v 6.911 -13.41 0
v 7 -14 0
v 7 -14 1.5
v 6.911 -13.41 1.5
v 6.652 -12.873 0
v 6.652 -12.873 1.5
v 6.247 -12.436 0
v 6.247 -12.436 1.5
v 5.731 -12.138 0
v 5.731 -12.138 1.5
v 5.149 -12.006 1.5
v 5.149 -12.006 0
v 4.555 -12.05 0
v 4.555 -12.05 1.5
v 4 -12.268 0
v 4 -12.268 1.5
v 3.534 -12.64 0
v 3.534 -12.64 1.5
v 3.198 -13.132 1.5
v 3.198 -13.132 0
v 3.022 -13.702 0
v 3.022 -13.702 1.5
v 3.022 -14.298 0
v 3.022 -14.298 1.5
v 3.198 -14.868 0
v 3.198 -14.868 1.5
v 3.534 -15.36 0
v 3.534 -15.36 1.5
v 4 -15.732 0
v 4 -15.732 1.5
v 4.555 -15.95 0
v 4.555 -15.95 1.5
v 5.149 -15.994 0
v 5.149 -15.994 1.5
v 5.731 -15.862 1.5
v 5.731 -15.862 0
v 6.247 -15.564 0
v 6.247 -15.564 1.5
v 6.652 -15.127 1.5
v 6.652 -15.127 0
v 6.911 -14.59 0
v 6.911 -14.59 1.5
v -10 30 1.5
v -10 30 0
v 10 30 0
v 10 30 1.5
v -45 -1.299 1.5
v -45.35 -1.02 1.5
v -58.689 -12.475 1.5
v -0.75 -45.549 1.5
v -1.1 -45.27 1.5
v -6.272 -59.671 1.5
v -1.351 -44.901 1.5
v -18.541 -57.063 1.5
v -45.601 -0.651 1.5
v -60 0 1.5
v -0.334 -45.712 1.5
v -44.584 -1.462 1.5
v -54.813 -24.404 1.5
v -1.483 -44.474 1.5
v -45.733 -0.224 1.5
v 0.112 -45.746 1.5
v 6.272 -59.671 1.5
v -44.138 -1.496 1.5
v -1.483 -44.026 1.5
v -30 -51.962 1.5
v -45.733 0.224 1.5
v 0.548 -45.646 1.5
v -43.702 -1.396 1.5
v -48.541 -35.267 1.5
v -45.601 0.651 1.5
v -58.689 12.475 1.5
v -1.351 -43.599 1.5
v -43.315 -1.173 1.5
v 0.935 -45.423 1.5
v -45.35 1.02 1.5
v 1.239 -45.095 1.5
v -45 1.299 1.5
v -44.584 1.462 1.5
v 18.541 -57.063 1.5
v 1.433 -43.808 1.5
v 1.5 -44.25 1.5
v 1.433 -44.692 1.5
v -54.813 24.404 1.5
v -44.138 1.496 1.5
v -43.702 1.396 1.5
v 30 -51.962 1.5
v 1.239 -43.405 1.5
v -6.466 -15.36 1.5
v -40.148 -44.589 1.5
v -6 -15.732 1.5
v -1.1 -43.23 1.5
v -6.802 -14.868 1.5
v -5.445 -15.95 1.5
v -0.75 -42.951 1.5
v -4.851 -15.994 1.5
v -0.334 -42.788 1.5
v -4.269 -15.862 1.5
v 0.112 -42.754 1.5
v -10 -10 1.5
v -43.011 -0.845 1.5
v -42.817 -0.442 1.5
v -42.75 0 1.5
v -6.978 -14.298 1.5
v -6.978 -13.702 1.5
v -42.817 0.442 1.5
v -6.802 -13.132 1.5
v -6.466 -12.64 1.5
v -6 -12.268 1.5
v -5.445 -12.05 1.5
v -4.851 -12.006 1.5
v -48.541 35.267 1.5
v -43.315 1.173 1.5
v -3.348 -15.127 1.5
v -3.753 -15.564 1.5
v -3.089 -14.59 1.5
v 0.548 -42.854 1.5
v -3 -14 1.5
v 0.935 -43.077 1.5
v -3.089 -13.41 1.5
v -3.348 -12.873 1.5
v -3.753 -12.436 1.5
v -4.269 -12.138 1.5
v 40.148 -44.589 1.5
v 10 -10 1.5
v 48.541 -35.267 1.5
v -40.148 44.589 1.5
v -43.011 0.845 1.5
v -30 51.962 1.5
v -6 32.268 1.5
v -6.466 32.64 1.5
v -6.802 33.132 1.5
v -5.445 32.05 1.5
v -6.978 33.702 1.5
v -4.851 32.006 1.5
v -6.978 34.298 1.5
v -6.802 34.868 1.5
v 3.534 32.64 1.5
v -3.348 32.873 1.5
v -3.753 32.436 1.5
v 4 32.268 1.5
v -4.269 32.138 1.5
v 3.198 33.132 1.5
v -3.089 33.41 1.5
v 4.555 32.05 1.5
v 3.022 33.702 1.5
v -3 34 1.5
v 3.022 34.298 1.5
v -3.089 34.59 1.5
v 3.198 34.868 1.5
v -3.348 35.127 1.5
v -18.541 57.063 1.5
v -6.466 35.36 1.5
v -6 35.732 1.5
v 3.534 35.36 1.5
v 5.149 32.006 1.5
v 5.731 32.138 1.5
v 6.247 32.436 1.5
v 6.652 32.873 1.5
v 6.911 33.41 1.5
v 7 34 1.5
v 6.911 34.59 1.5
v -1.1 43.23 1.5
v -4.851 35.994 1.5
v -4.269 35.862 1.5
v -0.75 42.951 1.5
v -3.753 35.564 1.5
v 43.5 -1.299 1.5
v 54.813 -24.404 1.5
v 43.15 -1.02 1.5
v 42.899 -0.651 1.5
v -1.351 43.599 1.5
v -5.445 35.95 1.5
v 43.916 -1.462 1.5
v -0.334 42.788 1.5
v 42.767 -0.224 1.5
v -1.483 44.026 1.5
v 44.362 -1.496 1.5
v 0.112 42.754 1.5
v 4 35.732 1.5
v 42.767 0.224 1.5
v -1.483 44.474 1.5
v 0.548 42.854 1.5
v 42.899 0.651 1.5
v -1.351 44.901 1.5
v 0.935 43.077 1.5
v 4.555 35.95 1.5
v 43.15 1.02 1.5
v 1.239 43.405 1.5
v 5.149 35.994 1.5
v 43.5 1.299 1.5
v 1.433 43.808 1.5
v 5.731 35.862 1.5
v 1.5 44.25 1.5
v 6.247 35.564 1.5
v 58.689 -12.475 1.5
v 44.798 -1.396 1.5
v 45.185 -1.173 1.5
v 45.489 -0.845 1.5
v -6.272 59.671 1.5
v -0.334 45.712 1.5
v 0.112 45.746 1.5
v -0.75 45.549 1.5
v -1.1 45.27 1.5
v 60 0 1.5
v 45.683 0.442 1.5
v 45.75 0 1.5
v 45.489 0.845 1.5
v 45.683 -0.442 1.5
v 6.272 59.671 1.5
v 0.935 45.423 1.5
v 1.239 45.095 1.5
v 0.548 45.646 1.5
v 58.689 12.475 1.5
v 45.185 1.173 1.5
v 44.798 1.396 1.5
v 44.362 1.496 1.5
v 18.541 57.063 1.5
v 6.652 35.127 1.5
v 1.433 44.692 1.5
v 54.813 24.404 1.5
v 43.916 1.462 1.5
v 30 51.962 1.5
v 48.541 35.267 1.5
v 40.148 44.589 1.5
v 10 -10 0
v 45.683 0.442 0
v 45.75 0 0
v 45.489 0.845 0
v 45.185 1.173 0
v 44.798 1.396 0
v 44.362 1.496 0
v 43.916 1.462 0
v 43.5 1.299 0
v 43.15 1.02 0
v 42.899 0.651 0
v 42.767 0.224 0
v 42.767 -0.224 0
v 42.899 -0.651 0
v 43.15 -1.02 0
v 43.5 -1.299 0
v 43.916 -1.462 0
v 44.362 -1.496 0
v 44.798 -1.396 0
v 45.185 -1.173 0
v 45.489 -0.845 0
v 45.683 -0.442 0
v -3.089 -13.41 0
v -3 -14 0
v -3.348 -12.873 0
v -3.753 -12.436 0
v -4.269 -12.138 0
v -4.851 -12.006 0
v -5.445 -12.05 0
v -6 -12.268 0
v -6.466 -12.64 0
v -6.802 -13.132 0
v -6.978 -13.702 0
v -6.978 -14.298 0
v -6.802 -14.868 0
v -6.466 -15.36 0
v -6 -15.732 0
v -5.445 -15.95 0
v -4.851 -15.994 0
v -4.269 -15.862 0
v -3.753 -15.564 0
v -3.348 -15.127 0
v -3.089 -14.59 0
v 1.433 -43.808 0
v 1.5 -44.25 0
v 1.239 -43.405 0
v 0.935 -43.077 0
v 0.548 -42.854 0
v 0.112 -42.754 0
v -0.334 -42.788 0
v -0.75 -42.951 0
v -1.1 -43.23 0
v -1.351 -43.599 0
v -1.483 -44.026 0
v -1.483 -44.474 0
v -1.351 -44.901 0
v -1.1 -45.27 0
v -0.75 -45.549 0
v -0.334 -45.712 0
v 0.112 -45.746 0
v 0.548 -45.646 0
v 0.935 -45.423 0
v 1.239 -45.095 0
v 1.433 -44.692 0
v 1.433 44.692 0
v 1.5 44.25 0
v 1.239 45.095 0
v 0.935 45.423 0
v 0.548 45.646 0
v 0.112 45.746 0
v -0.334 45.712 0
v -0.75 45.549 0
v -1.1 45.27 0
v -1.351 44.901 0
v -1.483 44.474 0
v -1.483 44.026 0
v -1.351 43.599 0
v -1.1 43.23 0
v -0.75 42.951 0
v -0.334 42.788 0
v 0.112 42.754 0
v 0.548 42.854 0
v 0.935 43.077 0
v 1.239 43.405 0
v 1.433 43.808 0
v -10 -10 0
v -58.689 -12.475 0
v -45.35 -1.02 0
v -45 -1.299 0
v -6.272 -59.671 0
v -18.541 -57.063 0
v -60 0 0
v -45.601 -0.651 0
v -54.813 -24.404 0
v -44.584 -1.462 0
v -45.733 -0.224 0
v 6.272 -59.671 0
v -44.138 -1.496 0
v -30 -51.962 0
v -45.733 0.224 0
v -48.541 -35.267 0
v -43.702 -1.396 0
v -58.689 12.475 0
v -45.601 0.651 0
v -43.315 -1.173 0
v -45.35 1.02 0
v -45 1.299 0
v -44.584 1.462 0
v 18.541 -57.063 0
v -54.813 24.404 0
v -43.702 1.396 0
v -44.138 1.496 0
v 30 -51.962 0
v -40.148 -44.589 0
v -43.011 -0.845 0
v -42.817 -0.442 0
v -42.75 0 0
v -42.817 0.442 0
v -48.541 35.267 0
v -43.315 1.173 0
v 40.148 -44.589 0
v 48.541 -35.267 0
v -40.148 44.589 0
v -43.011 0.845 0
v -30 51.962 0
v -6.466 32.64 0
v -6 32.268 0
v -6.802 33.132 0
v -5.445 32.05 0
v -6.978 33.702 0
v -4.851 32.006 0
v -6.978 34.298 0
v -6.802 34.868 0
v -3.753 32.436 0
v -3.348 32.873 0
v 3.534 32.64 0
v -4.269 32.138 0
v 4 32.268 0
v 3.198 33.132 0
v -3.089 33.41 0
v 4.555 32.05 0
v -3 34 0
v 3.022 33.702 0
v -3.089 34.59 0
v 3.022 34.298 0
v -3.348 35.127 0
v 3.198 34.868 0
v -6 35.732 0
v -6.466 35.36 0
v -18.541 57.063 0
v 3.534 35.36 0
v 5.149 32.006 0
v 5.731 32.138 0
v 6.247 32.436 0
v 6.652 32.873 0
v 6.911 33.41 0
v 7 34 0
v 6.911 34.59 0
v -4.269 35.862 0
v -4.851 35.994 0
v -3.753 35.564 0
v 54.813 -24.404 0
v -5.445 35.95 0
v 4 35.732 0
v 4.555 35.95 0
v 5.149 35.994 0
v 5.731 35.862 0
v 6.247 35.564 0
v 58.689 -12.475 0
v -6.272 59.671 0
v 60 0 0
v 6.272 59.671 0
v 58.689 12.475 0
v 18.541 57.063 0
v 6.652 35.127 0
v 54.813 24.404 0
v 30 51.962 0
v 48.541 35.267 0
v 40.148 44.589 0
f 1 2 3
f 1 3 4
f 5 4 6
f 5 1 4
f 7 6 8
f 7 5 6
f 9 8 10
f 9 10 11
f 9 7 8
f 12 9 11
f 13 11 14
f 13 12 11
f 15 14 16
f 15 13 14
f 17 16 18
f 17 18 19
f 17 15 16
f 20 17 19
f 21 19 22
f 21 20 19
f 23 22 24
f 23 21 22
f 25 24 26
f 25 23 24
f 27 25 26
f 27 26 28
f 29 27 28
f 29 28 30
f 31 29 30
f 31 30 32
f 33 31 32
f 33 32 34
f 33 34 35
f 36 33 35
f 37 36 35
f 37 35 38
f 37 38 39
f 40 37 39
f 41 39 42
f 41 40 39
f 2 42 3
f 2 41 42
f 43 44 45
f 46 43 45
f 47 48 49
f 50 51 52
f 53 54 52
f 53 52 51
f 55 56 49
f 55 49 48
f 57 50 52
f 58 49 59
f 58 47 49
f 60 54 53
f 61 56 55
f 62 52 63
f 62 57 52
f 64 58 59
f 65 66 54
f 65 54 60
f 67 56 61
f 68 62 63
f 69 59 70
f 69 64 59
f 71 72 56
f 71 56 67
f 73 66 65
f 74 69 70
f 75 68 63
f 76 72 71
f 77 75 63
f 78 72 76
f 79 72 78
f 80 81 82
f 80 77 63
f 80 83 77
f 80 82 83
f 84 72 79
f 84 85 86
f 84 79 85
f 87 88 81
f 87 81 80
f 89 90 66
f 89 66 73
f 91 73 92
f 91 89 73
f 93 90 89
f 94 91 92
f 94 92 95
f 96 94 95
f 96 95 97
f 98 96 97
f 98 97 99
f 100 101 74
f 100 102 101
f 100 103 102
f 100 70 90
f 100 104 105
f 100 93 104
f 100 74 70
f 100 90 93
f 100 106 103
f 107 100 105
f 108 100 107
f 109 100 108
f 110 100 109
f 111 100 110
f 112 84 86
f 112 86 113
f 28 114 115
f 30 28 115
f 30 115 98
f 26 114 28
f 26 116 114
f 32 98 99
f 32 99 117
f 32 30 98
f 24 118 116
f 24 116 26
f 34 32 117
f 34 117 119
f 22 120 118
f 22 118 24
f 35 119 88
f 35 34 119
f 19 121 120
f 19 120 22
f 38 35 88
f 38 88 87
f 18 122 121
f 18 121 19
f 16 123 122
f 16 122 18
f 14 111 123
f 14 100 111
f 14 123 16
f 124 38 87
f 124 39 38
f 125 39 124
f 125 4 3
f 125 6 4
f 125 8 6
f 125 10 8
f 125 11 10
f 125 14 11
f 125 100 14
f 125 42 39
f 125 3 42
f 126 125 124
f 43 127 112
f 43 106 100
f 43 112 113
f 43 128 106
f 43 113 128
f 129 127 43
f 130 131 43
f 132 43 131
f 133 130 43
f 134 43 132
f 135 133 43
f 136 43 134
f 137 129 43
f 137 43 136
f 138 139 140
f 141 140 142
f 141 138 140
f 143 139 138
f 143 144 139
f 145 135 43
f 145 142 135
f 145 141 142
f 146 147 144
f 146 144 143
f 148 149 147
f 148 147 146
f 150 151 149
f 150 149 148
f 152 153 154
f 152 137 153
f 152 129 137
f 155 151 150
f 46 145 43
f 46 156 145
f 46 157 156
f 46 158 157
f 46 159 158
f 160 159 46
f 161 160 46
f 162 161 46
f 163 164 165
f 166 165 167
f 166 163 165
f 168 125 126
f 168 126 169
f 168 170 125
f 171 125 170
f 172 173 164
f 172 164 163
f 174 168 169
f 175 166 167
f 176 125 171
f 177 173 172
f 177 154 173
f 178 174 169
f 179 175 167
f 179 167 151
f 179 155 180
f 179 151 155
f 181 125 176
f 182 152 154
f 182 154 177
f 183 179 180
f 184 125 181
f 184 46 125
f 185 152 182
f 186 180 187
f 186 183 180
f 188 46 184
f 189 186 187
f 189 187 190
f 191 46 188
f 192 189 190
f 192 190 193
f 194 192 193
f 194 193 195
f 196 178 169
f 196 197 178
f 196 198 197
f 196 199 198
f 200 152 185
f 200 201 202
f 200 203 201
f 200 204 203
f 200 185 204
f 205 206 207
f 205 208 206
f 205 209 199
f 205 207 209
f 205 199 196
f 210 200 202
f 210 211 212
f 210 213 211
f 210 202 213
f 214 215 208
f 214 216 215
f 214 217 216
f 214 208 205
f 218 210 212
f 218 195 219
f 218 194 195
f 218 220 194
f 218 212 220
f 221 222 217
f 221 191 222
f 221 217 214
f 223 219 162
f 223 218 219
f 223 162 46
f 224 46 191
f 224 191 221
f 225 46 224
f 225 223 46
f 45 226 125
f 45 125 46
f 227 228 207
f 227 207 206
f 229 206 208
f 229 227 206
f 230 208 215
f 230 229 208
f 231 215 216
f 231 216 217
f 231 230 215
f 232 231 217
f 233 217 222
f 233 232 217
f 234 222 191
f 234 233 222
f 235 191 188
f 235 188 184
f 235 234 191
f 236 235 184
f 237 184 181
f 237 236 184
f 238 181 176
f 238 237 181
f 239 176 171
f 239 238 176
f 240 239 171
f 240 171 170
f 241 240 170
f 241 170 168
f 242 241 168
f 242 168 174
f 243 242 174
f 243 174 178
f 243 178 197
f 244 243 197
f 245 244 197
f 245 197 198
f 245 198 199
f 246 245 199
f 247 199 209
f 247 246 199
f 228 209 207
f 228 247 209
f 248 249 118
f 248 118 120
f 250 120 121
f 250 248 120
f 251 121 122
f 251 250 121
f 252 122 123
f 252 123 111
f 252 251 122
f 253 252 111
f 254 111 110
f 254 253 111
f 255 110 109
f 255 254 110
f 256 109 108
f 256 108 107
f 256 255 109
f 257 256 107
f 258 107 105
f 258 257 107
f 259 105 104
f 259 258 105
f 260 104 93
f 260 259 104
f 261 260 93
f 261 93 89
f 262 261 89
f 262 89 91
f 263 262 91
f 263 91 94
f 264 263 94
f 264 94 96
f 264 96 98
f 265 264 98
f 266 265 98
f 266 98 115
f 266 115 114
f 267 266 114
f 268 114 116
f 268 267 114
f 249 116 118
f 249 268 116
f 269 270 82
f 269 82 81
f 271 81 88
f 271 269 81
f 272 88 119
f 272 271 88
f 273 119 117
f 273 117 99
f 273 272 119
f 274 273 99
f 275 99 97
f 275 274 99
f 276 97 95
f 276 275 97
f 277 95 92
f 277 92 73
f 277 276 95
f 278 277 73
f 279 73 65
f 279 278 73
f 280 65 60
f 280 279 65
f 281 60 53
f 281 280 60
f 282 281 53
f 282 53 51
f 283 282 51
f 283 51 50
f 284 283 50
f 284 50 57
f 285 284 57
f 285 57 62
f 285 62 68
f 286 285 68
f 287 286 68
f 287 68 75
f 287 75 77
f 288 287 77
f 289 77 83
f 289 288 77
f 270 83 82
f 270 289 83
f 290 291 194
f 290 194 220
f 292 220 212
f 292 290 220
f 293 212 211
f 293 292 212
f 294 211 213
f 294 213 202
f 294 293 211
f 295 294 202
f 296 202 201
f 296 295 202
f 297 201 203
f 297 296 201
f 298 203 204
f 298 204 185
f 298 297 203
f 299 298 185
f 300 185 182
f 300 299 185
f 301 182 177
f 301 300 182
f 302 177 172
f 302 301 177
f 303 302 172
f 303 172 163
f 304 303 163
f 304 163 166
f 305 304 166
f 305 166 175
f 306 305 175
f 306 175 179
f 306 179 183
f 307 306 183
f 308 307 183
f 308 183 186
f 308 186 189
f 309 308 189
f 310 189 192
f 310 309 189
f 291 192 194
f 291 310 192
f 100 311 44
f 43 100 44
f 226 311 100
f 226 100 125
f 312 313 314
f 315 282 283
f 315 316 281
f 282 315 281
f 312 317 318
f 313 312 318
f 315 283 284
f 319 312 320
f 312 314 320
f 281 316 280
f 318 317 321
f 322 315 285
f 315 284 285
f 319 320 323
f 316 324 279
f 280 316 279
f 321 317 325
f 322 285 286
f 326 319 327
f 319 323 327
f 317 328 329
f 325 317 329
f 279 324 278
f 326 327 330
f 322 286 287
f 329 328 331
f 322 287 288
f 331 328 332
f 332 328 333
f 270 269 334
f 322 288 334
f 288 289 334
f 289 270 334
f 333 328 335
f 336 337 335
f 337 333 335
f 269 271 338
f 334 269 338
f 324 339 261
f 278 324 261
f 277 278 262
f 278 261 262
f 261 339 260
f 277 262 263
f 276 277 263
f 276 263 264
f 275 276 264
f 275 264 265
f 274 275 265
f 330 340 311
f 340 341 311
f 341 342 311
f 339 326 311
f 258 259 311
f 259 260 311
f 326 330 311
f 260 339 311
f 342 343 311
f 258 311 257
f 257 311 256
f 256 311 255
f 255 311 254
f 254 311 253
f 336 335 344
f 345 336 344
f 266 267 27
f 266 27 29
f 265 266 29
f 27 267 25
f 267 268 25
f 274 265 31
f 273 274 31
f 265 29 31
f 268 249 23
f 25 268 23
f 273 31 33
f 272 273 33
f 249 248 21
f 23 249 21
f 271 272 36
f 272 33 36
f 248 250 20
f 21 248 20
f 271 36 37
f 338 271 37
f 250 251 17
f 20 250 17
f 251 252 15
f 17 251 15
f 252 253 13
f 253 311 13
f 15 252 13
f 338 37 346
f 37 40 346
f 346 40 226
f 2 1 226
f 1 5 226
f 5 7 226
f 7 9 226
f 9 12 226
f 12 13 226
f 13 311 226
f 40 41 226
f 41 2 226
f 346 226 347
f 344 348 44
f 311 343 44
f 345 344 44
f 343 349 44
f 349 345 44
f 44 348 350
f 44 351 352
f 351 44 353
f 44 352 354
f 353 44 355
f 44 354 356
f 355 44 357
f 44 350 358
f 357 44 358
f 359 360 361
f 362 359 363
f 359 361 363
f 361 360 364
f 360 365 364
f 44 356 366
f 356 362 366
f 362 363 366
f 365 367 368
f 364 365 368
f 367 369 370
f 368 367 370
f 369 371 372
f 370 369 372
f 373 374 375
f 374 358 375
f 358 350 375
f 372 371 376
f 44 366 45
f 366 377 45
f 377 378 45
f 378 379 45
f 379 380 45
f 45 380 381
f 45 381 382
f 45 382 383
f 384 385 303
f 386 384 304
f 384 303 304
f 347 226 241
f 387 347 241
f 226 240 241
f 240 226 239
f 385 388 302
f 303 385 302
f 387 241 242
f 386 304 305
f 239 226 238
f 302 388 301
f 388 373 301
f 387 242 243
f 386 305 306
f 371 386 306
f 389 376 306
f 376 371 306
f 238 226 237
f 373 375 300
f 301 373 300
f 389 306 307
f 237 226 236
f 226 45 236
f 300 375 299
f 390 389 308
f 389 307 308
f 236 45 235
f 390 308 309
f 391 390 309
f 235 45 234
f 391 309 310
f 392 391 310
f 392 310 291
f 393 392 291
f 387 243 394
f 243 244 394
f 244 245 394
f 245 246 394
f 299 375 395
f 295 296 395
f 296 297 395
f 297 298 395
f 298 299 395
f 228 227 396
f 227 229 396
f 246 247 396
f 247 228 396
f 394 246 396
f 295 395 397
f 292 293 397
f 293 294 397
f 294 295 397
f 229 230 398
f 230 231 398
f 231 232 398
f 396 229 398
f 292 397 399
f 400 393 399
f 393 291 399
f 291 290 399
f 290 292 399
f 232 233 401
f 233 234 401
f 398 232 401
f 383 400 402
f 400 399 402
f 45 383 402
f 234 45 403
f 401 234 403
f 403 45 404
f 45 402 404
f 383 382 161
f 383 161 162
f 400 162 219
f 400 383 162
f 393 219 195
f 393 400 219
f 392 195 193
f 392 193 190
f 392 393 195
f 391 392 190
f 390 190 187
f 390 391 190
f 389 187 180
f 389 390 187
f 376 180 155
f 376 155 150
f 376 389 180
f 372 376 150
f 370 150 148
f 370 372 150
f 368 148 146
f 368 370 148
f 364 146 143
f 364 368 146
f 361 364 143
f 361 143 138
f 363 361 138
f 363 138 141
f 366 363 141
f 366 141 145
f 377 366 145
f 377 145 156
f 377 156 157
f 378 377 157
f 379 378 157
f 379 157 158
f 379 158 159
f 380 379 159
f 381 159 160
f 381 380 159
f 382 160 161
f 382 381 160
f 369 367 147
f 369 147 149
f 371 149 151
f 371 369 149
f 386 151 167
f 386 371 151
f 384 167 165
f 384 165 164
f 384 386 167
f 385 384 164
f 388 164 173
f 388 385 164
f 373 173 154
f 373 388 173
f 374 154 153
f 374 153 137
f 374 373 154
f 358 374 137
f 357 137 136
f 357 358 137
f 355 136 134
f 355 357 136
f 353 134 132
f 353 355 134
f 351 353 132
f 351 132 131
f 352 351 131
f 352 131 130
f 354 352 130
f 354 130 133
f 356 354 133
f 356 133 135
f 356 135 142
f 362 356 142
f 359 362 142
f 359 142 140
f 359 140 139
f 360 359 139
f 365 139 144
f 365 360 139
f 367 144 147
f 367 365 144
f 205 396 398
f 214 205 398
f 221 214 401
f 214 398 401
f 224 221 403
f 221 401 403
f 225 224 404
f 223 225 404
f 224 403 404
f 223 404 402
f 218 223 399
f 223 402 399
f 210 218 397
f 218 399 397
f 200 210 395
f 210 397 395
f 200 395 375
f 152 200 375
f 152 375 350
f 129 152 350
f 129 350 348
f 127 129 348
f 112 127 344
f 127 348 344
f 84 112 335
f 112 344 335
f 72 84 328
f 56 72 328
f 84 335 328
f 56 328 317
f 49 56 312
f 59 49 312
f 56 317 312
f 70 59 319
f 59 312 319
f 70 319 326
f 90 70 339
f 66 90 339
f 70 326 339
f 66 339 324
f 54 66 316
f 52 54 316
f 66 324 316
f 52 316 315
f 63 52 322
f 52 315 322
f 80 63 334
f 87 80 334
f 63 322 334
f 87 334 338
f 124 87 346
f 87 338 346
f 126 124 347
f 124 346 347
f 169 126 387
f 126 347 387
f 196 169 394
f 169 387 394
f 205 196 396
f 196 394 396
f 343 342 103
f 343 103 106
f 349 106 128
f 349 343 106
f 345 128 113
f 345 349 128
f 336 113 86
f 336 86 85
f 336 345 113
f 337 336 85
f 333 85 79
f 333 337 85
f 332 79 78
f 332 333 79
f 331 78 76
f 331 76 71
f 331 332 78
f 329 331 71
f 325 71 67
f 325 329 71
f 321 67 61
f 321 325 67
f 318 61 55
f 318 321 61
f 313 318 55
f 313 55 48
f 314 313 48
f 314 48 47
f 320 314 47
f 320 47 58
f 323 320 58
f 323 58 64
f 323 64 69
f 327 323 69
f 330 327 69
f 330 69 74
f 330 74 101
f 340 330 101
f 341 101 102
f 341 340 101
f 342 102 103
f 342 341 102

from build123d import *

# Parameters (mm, degrees)
SKETCH_1_R      = 60
SKETCH_1_R_2    = 2
SKETCH_1_R_3    = 1.5
SKETCH_1_W      = 20
SKETCH_1_H      = 40
EXTRUDE_1_DEPTH = 1.5


with BuildPart() as part:
    # 草图1 → 凸台-拉伸1 (new body)
    with BuildSketch(Plane.XY):
        Circle(SKETCH_1_R)
        with Locations((5, 34)):
            Circle(SKETCH_1_R_2, mode=Mode.SUBTRACT)
        with Locations((-5, 34)):
            Circle(SKETCH_1_R_2, mode=Mode.SUBTRACT)
        with Locations((5, -14)):
            Circle(SKETCH_1_R_2, mode=Mode.SUBTRACT)
        with Locations((-5, -14)):
            Circle(SKETCH_1_R_2, mode=Mode.SUBTRACT)
        with Locations((0, 44.25)):
            Circle(SKETCH_1_R_3, mode=Mode.SUBTRACT)
        with Locations((44.25, 0)):
            Circle(SKETCH_1_R_3, mode=Mode.SUBTRACT)
        with Locations((0, -44.25)):
            Circle(SKETCH_1_R_3, mode=Mode.SUBTRACT)
        with Locations((-44.25, 0)):
            Circle(SKETCH_1_R_3, mode=Mode.SUBTRACT)
        with Locations((0, 10)):
            Rectangle(SKETCH_1_W, SKETCH_1_H, mode=Mode.SUBTRACT)
    extrude(amount=EXTRUDE_1_DEPTH)


solid = part.part
